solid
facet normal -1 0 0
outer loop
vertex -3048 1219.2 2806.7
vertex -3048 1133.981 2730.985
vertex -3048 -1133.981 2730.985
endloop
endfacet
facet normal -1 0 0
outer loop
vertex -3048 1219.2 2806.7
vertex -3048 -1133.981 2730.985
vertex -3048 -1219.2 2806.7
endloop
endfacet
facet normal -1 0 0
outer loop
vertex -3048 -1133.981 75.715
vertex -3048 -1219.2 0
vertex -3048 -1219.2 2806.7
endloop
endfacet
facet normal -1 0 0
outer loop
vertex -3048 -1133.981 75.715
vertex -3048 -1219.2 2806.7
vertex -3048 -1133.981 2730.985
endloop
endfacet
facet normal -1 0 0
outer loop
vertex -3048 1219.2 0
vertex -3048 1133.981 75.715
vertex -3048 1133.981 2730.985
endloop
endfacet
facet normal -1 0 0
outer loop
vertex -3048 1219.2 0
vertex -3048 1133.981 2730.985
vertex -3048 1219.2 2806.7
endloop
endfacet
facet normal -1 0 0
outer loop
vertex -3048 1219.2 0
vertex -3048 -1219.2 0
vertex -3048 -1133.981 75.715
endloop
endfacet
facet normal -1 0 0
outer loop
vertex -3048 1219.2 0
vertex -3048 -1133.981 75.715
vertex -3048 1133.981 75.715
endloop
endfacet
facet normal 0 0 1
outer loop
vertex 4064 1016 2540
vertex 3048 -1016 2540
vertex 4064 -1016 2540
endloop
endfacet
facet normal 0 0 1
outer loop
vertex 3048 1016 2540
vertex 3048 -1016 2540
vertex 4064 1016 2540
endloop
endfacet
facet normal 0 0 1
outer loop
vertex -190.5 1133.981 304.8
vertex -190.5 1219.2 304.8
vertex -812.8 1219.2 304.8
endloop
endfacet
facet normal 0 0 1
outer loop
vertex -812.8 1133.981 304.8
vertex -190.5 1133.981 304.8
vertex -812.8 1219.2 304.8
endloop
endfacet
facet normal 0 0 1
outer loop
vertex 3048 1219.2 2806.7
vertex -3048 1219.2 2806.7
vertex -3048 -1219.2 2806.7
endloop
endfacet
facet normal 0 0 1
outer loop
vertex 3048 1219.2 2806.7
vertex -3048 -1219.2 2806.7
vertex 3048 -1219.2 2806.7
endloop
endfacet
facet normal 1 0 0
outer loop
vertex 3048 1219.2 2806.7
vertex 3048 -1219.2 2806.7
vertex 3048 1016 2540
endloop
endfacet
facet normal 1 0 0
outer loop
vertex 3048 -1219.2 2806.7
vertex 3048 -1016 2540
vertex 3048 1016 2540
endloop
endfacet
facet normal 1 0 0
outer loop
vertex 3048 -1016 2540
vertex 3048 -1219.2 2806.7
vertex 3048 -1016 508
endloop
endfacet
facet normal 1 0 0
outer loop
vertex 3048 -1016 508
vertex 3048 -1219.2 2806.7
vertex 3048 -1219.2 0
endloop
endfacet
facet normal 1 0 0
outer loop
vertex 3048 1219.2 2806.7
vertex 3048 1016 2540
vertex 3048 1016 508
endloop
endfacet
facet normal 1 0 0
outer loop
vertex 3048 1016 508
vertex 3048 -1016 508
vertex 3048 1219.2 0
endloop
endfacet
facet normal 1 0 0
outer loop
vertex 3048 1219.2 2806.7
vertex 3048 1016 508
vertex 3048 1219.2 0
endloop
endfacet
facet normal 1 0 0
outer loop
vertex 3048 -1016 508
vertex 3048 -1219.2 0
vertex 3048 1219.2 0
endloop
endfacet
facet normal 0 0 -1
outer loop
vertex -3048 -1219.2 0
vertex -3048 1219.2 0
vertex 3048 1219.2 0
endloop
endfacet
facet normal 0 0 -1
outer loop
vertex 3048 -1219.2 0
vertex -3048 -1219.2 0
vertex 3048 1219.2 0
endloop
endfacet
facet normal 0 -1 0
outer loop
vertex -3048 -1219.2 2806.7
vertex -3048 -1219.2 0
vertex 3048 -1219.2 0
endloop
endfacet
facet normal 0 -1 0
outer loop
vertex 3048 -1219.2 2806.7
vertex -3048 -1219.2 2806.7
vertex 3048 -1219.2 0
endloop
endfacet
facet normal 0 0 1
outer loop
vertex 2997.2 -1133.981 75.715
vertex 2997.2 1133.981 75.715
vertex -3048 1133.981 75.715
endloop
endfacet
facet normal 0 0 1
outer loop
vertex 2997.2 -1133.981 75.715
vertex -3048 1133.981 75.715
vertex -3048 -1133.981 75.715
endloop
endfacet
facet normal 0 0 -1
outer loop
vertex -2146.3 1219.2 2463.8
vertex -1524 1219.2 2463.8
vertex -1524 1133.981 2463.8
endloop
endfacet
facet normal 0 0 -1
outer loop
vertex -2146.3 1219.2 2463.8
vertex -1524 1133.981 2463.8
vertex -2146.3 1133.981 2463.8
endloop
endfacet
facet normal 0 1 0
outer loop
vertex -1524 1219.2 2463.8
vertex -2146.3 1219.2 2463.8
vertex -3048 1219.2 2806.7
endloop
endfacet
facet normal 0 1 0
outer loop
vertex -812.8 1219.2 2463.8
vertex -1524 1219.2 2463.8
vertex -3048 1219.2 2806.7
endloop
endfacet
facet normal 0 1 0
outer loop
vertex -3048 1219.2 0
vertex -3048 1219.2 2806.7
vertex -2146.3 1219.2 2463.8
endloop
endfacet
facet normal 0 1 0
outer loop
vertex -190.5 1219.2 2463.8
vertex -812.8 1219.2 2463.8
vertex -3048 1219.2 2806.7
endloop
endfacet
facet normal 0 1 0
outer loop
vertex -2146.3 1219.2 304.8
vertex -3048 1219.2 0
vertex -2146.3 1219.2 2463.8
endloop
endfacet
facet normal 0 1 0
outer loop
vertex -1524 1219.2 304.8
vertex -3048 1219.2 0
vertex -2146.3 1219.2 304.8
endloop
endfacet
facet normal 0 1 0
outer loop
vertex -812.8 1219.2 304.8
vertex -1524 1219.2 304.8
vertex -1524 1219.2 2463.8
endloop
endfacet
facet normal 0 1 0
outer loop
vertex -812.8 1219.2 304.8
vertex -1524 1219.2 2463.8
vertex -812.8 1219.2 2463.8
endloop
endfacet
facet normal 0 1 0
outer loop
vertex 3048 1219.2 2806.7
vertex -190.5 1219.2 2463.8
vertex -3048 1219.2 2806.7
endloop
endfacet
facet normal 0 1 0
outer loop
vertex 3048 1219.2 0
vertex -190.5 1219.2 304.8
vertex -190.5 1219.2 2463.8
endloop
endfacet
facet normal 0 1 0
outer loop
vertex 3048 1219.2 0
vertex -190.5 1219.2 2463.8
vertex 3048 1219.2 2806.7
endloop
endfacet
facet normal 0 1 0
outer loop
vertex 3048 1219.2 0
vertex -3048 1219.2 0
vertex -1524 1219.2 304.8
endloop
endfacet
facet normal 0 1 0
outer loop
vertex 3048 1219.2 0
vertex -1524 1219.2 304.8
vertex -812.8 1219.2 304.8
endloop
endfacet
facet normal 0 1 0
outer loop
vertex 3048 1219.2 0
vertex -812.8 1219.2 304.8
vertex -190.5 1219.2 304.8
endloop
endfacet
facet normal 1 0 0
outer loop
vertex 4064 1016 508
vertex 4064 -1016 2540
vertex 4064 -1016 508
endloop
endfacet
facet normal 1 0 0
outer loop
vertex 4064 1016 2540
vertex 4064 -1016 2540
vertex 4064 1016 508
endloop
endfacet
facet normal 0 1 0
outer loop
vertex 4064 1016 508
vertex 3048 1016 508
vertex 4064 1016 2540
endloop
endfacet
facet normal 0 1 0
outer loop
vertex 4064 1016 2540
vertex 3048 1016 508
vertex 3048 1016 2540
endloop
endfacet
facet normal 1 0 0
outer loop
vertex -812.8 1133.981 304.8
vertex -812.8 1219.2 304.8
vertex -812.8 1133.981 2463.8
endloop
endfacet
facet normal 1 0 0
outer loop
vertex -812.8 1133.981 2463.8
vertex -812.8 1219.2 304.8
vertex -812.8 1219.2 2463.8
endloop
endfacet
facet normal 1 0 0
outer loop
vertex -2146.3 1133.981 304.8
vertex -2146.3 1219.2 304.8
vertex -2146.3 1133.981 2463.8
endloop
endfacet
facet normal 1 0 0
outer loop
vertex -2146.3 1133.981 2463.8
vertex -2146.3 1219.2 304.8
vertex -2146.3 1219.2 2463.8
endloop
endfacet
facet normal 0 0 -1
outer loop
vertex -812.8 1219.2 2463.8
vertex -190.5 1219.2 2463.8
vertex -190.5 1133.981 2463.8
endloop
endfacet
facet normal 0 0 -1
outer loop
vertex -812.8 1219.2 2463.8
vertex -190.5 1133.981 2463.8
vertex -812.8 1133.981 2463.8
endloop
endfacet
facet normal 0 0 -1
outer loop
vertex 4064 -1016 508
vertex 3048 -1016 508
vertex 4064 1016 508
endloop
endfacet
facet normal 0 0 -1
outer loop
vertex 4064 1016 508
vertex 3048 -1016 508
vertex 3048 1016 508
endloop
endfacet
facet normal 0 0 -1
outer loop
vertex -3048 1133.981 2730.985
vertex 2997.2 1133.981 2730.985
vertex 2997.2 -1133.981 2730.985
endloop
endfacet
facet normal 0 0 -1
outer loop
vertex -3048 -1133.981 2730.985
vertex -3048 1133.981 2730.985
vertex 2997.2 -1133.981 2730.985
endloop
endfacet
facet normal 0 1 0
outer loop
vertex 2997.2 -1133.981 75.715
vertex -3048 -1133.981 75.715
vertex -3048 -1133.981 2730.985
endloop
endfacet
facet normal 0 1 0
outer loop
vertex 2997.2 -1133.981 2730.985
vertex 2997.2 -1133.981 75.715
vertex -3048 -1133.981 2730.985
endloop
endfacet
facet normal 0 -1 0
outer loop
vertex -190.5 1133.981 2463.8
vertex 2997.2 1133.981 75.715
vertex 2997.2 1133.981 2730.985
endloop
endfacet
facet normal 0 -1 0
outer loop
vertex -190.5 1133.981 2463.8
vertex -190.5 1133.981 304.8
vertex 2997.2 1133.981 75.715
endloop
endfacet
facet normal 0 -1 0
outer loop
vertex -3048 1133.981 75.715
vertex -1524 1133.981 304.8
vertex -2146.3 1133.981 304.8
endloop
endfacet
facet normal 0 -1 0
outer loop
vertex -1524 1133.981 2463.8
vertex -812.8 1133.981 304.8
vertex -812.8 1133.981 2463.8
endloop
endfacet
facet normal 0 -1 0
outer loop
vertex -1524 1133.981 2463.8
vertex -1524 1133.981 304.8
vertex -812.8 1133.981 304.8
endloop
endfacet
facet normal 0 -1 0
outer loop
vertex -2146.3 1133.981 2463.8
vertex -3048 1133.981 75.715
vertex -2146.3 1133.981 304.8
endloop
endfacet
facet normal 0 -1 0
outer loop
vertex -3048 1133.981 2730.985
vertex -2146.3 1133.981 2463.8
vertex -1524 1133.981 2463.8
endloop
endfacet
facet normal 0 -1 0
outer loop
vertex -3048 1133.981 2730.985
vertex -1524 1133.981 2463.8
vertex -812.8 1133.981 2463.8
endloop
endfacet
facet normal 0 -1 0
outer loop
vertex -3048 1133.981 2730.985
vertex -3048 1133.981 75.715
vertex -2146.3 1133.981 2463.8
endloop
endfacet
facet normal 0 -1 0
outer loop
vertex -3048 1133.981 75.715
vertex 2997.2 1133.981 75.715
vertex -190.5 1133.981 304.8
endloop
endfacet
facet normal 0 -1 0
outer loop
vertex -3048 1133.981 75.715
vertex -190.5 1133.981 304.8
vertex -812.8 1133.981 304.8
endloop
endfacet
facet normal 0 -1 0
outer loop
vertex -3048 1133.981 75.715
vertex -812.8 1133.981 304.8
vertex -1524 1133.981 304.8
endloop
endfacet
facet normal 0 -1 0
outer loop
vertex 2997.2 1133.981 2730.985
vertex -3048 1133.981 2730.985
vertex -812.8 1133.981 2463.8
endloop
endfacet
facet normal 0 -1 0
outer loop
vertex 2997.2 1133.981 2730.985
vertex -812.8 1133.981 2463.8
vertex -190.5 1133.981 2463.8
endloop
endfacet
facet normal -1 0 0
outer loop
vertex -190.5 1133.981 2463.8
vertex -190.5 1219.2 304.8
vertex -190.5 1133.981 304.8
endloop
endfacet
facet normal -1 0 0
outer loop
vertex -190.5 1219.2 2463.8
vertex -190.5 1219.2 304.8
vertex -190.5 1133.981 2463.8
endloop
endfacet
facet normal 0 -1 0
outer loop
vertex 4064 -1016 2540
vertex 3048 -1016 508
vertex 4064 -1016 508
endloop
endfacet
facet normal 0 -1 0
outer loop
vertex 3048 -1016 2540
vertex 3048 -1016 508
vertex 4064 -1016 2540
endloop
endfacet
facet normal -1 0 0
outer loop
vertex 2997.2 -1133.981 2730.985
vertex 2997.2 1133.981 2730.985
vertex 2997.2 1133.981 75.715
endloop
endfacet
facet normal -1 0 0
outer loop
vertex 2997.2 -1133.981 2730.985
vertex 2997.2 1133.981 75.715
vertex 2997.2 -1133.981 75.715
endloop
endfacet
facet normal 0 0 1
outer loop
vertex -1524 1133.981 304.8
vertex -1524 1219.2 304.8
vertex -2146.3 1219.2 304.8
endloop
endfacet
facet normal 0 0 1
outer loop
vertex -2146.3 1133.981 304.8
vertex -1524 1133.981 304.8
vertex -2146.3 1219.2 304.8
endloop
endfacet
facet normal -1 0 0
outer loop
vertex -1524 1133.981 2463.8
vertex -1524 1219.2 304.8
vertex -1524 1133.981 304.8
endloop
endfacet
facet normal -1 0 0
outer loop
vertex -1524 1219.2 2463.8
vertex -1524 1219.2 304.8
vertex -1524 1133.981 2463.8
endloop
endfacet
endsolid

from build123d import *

# Parameters (mm, degrees)
F0_W     = 6096
F0_H     = 2438.4
F1_DEPTH = 2806.7
F3_W     = 2267.961026
F3_H     = 2655.269852
F4_DEPTH = 6045.2
F5_W     = 622.3
F5_H     = 2159
F6_DEPTH = 254
F2_W     = 2032
F2_H     = 2032
F7_DEPTH = 1016


with BuildPart() as f1:
    # F0 (on Top) → F1 (new body)
    with BuildSketch(Plane.XY):
        Rectangle(F0_W, F0_H)
    extrude(amount=F1_DEPTH)

    # F3 (on face) → F4 (cut)
    with BuildSketch(Plane(origin=(-3048, 0, 0), x_dir=(0, -1, 0), z_dir=(-1, 0, 0))):
        with Locations((0, 1403.35)):
            Rectangle(F3_W, F3_H)
    extrude(amount=-F4_DEPTH, mode=Mode.SUBTRACT)

    # F5 (on face) → F6 (cut)
    with BuildSketch(Plane(origin=(0, 1219.2, 0), x_dir=(-1, 0, 0), z_dir=(0, 1, 0))):
        with Locations((1835.15, 1384.3)):
            Rectangle(F5_W, F5_H)
        with Locations((501.65, 1384.3)):
            Rectangle(F5_W, F5_H)
    extrude(amount=-F6_DEPTH, mode=Mode.SUBTRACT)

    # F2 (on face) → F7 (join)
    with BuildSketch(Plane.YZ.offset(3048)):
        with Locations((0, 1524)):
            Rectangle(F2_W, F2_H)
    extrude(amount=F7_DEPTH)


solid = f1.part
